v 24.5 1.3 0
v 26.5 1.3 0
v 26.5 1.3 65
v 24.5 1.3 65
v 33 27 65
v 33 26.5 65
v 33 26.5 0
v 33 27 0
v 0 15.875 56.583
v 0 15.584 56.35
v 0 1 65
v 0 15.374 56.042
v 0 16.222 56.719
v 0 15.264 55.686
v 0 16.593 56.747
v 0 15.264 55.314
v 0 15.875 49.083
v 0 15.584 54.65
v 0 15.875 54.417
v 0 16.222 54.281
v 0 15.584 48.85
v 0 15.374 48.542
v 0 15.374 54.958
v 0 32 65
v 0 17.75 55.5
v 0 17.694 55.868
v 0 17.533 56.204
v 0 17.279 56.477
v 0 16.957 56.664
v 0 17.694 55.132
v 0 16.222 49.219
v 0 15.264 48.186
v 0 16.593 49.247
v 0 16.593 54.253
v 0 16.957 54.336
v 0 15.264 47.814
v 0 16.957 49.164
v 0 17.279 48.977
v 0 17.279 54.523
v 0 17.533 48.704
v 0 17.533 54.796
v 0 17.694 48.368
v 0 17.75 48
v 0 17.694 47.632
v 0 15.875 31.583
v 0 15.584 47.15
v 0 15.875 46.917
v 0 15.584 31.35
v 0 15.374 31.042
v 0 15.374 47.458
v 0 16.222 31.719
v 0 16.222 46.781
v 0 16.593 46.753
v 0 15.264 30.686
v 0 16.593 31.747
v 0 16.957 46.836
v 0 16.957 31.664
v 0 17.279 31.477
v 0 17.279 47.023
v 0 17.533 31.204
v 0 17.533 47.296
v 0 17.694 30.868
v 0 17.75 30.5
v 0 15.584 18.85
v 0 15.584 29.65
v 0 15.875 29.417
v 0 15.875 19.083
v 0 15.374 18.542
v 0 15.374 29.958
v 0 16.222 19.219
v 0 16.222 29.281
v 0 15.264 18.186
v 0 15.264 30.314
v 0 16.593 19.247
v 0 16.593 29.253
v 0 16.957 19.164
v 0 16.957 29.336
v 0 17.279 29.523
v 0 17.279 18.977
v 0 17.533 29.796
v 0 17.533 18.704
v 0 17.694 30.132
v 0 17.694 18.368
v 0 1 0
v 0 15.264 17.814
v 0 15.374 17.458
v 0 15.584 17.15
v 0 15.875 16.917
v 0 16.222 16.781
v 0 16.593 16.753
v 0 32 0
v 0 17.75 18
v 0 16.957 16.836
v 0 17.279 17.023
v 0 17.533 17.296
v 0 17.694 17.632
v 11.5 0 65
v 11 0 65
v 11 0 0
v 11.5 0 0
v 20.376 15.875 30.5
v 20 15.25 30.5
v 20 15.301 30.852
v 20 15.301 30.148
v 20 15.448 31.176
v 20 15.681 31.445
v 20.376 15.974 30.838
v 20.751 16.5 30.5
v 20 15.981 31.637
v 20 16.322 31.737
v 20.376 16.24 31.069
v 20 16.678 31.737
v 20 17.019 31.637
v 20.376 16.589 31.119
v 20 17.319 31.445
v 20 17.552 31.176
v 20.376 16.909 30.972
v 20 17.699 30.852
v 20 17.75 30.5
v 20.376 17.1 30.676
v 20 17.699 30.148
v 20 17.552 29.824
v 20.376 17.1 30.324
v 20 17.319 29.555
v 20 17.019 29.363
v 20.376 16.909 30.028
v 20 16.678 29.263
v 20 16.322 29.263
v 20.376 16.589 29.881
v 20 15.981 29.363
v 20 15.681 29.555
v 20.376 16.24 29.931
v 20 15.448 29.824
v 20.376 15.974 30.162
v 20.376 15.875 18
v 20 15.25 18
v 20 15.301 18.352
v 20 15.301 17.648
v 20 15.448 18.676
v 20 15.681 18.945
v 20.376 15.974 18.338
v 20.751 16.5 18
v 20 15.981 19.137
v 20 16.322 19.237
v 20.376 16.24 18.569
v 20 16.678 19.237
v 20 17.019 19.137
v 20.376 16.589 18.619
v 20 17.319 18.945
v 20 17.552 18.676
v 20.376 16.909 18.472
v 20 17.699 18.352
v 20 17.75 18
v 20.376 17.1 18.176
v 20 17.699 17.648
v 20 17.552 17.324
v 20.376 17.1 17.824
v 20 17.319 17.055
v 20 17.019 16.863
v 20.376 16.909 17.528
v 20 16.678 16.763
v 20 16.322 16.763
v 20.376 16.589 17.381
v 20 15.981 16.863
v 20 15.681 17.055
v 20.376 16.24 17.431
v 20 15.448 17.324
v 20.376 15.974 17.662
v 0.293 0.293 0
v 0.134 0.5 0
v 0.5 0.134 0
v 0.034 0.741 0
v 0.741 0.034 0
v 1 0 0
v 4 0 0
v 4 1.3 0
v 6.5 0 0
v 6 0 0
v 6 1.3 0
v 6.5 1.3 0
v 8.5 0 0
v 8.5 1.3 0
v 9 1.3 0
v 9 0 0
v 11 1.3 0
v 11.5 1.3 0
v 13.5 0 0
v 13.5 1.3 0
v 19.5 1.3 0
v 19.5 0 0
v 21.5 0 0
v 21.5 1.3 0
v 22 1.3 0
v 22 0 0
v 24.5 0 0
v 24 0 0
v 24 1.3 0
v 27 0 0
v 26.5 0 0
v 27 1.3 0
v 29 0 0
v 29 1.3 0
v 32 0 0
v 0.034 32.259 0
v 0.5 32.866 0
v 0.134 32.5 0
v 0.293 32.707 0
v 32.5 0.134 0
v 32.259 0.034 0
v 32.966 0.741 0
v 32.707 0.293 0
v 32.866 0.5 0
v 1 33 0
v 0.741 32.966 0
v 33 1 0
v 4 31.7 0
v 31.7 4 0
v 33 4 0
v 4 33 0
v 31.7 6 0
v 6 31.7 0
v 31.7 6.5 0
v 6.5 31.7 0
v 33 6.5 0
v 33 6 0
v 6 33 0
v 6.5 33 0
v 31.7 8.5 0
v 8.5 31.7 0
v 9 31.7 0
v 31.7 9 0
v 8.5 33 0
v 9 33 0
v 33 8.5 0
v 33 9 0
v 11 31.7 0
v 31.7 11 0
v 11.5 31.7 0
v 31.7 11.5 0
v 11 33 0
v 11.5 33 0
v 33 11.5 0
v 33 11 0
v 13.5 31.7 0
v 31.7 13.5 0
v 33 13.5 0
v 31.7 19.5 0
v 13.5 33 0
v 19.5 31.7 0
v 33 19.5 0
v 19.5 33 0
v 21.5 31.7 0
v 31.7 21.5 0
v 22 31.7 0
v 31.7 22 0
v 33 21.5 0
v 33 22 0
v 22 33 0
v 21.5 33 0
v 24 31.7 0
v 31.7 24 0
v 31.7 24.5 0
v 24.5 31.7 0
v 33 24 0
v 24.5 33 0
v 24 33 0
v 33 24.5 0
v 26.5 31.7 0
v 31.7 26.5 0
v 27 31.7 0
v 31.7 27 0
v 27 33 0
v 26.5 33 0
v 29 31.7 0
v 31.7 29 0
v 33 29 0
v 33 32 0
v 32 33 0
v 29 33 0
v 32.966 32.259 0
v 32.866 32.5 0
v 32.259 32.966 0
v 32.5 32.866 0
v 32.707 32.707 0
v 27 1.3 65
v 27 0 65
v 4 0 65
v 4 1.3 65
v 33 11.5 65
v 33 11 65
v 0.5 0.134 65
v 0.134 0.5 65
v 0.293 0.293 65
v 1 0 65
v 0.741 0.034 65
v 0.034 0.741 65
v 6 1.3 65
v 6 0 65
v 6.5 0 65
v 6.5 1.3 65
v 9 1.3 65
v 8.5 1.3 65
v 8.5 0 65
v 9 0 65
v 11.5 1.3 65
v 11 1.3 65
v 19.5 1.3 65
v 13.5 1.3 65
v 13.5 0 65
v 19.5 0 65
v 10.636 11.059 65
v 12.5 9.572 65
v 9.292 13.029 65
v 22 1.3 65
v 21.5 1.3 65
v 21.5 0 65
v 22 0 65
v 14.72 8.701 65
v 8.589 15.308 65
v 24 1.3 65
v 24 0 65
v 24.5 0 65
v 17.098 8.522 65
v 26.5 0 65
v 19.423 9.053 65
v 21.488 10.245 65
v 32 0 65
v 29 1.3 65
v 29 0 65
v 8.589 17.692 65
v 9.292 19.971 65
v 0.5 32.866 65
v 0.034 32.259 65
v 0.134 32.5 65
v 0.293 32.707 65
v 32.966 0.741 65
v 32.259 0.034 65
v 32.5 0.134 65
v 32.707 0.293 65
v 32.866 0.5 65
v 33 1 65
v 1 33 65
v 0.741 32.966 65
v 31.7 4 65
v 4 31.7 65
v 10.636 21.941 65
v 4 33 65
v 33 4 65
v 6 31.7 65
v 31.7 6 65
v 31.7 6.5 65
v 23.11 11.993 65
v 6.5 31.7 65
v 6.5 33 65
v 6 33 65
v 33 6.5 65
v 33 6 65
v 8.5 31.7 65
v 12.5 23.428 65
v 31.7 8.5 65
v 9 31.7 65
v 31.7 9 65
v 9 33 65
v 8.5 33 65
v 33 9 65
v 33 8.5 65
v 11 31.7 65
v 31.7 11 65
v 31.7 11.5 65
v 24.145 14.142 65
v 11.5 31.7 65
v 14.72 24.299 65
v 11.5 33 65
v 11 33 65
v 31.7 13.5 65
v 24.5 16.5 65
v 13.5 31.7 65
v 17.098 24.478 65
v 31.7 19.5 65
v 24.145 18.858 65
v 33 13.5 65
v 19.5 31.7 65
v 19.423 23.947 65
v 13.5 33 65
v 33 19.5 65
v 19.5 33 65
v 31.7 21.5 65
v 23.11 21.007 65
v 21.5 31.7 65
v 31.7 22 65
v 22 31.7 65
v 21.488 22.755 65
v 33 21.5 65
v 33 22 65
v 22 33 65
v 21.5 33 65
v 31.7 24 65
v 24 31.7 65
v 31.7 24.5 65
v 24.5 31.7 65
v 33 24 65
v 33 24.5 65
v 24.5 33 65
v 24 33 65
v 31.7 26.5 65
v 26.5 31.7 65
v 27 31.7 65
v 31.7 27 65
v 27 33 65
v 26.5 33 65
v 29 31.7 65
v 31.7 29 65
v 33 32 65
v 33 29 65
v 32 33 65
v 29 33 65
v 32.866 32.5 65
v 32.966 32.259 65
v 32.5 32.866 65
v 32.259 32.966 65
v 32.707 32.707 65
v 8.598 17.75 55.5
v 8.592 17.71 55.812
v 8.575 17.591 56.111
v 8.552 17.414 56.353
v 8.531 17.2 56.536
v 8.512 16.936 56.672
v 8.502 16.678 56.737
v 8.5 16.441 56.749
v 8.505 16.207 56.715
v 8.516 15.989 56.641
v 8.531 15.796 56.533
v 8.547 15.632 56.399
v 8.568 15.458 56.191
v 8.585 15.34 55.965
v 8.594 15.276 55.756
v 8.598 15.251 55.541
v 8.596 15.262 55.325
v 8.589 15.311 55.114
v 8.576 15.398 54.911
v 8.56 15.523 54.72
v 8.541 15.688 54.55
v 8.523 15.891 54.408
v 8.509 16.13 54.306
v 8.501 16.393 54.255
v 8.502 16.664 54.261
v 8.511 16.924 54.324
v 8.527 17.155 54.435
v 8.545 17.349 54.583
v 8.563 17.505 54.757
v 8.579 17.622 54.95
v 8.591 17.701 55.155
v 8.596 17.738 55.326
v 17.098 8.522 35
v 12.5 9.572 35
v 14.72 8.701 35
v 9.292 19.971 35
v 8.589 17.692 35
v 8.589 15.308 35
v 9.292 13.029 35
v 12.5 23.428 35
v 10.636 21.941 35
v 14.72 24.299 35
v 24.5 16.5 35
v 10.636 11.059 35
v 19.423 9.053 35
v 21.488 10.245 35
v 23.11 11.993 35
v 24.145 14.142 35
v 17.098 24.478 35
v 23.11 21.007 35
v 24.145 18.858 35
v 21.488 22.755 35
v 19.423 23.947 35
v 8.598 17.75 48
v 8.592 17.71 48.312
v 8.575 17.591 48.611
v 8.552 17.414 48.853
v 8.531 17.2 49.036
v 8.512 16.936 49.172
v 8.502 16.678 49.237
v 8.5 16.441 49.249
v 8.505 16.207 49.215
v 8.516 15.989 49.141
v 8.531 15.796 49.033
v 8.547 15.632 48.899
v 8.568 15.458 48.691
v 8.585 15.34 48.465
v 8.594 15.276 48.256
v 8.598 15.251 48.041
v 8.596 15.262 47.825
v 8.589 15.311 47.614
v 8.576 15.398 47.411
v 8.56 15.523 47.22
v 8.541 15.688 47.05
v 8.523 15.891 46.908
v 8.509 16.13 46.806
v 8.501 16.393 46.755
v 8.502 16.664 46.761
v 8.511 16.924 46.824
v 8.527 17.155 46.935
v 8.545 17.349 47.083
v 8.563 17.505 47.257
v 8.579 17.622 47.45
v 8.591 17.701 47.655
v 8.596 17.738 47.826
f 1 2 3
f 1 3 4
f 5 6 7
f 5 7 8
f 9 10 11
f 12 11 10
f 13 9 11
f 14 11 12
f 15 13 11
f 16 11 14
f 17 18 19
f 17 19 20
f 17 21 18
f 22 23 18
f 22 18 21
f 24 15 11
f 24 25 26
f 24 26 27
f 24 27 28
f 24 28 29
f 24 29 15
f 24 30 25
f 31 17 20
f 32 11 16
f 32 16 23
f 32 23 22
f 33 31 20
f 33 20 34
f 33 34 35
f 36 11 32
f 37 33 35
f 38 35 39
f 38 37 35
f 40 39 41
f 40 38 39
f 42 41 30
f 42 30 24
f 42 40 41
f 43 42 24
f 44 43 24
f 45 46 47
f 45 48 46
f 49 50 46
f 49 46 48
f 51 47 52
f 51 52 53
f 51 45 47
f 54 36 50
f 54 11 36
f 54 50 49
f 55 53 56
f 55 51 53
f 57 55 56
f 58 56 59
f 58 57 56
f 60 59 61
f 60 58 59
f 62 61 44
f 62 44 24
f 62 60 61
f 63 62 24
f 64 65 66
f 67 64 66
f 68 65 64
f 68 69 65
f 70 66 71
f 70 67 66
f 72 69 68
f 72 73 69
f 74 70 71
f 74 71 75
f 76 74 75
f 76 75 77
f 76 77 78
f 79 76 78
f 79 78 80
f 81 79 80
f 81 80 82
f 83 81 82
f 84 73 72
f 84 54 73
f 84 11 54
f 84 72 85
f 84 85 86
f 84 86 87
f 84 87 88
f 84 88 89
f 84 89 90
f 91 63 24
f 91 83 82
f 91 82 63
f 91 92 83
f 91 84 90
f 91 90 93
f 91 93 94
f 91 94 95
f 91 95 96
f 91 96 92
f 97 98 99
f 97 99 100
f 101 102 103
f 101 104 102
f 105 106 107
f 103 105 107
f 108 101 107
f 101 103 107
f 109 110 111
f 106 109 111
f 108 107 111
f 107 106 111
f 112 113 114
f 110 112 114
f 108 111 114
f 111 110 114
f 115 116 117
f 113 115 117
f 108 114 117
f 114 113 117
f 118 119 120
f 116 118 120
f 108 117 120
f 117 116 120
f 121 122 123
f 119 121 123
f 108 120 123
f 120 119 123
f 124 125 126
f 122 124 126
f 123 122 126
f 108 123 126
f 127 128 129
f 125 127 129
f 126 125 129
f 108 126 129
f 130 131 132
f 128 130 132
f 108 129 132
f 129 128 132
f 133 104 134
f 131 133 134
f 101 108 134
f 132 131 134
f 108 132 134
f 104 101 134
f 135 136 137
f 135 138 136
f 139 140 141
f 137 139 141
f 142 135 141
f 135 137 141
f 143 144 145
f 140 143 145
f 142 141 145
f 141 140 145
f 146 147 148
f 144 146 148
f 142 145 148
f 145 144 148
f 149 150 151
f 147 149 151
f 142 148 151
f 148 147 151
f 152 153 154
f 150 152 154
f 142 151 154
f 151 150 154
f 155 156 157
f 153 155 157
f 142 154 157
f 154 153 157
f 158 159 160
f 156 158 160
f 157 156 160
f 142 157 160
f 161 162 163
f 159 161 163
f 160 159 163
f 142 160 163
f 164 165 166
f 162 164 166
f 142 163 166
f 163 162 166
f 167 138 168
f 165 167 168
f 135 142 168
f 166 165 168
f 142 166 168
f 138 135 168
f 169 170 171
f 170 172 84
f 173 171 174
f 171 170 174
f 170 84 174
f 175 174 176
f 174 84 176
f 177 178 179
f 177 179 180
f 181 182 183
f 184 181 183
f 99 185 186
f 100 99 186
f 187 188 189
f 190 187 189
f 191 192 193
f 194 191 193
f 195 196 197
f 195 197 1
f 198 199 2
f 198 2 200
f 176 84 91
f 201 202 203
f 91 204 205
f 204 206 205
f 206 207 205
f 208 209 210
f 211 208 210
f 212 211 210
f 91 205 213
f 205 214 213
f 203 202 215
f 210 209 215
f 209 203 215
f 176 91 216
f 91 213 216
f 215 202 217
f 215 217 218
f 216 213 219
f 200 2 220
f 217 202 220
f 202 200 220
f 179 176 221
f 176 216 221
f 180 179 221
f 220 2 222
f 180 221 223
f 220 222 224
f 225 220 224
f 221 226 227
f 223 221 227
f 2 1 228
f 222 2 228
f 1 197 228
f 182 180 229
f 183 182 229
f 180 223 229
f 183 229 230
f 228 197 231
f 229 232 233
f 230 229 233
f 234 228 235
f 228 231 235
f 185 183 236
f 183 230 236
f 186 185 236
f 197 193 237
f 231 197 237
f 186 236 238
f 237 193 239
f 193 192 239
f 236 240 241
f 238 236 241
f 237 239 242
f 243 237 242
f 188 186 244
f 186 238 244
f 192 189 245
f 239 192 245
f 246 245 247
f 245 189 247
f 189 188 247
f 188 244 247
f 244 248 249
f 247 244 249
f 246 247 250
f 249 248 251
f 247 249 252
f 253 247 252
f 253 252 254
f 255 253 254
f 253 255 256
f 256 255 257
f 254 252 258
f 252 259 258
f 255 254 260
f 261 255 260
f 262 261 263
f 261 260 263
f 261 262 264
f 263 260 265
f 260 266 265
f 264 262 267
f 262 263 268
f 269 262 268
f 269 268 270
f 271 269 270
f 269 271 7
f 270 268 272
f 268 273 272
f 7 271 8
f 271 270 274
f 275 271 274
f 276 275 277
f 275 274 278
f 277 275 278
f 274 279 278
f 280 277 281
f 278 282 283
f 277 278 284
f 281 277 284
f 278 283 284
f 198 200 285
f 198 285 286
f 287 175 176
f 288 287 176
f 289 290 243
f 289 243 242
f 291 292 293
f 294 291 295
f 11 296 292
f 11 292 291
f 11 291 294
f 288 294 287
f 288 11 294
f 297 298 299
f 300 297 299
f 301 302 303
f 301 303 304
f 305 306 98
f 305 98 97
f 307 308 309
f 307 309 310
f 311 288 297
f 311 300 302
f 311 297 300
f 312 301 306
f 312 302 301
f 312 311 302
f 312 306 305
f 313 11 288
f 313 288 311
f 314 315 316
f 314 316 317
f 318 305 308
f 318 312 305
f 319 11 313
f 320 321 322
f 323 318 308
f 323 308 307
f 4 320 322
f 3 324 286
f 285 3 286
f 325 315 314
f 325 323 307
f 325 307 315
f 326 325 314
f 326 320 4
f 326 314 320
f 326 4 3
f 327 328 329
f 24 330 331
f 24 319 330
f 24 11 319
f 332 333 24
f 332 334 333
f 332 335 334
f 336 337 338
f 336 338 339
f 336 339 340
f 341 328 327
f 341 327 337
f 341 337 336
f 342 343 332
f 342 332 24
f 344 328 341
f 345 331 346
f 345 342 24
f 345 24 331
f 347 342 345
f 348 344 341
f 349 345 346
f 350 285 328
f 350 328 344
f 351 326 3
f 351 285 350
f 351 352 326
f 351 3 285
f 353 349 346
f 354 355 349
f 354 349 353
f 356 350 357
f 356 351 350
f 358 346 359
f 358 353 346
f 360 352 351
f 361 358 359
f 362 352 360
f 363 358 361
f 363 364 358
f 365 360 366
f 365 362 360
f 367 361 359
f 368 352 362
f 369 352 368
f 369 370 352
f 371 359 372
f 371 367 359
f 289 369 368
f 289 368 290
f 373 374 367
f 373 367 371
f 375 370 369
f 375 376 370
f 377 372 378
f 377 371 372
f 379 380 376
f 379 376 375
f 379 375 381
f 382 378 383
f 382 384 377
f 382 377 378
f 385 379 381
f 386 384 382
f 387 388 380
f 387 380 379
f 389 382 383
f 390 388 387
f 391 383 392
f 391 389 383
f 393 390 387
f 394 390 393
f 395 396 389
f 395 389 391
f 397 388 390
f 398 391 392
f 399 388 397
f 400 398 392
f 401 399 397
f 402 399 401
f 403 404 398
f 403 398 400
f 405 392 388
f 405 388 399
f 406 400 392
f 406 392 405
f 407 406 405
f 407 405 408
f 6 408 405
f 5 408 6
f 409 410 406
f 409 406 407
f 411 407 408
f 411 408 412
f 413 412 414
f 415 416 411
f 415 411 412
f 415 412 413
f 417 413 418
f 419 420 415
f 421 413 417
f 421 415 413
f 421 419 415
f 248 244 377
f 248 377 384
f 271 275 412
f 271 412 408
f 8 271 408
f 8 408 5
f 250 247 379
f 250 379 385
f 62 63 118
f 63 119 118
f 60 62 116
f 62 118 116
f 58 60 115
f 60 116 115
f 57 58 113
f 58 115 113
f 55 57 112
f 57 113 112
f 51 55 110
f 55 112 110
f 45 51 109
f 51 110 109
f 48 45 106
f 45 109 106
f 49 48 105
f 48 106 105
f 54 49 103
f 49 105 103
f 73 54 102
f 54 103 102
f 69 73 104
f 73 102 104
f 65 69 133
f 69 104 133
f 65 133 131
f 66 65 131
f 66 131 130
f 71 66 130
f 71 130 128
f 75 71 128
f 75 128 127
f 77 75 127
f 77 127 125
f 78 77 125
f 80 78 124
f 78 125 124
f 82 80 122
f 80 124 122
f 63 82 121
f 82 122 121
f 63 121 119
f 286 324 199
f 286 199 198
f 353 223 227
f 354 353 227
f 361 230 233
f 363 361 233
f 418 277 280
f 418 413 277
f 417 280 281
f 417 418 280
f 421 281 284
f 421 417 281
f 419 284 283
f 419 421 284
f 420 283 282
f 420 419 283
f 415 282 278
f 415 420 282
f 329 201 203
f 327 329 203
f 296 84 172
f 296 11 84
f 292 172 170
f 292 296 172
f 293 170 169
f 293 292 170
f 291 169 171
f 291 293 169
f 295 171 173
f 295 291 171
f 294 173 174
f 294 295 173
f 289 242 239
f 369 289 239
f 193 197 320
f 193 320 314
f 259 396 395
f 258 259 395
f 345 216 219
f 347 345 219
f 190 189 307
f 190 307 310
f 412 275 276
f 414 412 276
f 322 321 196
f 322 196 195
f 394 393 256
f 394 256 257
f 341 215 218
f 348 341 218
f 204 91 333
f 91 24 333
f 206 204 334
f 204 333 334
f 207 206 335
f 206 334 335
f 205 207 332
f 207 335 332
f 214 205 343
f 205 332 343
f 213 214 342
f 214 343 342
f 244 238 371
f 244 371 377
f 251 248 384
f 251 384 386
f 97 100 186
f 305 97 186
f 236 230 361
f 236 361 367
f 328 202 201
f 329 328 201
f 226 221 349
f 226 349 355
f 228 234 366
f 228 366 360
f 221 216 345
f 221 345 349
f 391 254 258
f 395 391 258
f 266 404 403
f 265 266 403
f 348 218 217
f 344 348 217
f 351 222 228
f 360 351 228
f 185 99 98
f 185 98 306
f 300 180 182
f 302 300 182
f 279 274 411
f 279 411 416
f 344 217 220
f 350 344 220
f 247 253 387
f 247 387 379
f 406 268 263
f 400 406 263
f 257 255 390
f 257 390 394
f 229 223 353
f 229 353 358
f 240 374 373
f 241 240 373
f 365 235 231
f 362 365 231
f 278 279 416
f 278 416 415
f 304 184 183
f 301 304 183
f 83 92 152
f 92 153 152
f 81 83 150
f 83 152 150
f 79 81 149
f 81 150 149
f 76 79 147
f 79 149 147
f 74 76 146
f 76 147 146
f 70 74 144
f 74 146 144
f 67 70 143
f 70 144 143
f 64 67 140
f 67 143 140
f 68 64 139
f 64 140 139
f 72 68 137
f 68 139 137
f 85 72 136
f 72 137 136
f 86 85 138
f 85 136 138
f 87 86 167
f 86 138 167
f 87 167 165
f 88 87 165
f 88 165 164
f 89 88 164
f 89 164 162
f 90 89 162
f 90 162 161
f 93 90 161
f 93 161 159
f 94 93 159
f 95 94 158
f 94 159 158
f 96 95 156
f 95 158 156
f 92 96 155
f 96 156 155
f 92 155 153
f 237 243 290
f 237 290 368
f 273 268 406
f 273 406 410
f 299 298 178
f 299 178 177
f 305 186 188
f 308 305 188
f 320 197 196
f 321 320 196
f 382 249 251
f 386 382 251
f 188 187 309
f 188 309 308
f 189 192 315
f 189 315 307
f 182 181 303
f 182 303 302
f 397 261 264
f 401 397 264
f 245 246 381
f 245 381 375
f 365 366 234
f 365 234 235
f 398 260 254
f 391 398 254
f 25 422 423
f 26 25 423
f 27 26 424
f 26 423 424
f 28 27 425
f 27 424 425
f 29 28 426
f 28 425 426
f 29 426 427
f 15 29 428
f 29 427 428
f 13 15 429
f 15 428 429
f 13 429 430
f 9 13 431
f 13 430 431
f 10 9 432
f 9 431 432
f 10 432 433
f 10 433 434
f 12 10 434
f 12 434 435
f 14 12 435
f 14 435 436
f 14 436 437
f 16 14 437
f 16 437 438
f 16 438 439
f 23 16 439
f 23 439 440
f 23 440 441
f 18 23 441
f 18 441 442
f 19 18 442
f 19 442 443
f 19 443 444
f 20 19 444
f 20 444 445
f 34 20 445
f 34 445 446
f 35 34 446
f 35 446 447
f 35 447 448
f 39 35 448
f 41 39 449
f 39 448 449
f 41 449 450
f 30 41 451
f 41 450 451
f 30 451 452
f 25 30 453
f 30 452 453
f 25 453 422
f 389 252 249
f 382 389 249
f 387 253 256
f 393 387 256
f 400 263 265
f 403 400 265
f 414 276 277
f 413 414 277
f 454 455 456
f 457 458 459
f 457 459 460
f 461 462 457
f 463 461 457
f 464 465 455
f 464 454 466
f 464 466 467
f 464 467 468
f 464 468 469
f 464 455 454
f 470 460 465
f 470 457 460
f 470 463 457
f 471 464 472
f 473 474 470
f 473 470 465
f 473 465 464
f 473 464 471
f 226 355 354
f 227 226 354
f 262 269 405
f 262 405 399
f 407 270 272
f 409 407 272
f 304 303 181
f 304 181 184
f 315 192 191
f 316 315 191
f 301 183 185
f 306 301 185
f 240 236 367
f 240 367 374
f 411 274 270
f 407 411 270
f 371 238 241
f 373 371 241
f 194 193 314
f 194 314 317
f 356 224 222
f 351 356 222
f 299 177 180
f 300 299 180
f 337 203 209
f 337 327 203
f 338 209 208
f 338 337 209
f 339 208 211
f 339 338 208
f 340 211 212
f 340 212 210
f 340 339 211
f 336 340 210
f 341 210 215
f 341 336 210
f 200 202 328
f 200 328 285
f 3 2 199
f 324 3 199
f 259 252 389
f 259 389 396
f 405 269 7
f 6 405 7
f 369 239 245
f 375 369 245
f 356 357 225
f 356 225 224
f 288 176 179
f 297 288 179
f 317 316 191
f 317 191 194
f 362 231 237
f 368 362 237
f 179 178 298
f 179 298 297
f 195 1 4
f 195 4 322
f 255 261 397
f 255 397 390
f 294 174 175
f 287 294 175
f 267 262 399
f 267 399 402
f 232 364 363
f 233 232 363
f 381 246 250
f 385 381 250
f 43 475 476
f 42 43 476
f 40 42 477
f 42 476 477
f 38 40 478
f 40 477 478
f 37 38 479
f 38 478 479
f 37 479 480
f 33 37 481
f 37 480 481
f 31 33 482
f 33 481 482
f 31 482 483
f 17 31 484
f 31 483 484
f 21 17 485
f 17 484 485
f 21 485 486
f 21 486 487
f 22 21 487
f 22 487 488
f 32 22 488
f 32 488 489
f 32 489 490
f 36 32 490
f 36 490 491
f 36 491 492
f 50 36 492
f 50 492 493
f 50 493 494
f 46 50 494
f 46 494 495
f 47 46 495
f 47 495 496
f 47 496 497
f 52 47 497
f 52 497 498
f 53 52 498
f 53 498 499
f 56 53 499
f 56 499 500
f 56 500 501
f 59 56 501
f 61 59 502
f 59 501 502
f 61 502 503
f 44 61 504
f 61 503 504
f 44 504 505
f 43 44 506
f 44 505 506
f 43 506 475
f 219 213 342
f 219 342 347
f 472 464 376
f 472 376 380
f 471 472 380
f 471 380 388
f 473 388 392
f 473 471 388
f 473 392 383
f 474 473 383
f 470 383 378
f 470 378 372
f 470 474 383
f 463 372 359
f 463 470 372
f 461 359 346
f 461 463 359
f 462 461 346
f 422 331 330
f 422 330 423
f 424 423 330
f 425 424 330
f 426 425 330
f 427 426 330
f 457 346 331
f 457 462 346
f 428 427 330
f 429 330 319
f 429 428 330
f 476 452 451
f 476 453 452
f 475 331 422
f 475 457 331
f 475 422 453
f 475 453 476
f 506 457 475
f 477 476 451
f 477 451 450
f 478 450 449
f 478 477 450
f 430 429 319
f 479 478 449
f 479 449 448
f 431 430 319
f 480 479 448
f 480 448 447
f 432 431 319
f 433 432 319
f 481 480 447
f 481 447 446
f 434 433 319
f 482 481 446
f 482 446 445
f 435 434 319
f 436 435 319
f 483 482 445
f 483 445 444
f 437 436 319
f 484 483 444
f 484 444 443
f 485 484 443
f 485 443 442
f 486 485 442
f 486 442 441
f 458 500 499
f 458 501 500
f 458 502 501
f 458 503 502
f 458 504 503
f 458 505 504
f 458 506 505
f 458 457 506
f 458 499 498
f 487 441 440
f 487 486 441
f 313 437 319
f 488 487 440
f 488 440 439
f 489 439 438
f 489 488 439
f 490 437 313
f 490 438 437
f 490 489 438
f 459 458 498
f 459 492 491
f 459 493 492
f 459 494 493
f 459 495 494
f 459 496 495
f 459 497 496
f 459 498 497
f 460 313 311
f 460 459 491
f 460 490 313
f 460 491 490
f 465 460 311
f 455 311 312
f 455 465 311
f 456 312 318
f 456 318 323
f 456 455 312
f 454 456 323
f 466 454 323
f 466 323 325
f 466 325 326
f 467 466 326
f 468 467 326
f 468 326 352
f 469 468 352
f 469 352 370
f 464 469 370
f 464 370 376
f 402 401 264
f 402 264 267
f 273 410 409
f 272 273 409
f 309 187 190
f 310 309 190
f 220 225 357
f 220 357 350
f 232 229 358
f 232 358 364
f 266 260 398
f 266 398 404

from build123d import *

# Parameters (mm, degrees)
SKETCH1_W                   = 33
SKETCH1_H                   = 33
BOSS_EXTRUDE1_DEPTH         = 65
FILLET1_R                   = 1
CUT_EXTRUDE2_START          = -30
CUT_EXTRUDE2_OUTLINE_R      = 8
CUT_EXTRUDE2_DEPTH          = 30
TAP_DRILL_FOR_M3_TAP1_D     = 2.5
TAP_DRILL_FOR_M3_TAP1_DEPTH = 20
TAP_DRILL_FOR_M3_TAP1_TIP   = 0.751075774
CUT_EXTRUDE5_REACH          = 82.019
SKETCH6_W                   = 2
SKETCH6_H                   = 1.3
CIRPATTERN1_COUNT           = 3
CIRPATTERN1_ANGLE           = 180
CIRPATTERN1_COPY_1_REACH    = 82.019
CIRPATTERN1_COPY_1_SKETCH_W = 2
CIRPATTERN1_COPY_1_SKETCH_H = 1.3
CIRPATTERN1_COPY_2_REACH    = 82.019
CIRPATTERN1_COPY_2_SKETCH_W = 2
CIRPATTERN1_COPY_2_SKETCH_H = 1.3


# Read off the part's stored shape, not the designer's step: Cut-Extrude2
with BuildPart() as part:
    # Sketch1 → Boss-Extrude1 (new body)
    with BuildSketch(Plane.XY):
        with Locations((16.5, 16.5)):
            Rectangle(SKETCH1_W, SKETCH1_H)
    extrude(amount=BOSS_EXTRUDE1_DEPTH)

    # Fillet1
    fillet1_edges = [part.edges().sort_by_distance(p)[0] for p in [
        (0, 33, 32.5),
        (33, 33, 32.5),
        (33, 0, 32.5),
        (0, 0, 32.5),
    ]]
    fillet(fillet1_edges, radius=FILLET1_R)

    # Cut-Extrude2 outline → Cut-Extrude2 (cut)
    with BuildSketch(Plane.XY.offset(65).offset(CUT_EXTRUDE2_START)):
        with Locations((16.5, 16.5)):
            Circle(CUT_EXTRUDE2_OUTLINE_R)
    extrude(amount=CUT_EXTRUDE2_DEPTH, mode=Mode.SUBTRACT)

    # Tap Drill for M3 Tap1
    with Locations(Plane(origin=(0, 0, 0), x_dir=(0, -1, 0), z_dir=(-1, 0, 0))):
        with Locations((-16.5, 55.5), (-16.5, 48), (-16.5, 30.5), (-16.5, 18)):
            Hole(TAP_DRILL_FOR_M3_TAP1_D / 2, depth=TAP_DRILL_FOR_M3_TAP1_DEPTH)
            with Locations((0, 0, -(TAP_DRILL_FOR_M3_TAP1_DEPTH + TAP_DRILL_FOR_M3_TAP1_TIP / 2))):  # 118° drill point
                Cone(0, TAP_DRILL_FOR_M3_TAP1_D / 2, TAP_DRILL_FOR_M3_TAP1_TIP, mode=Mode.SUBTRACT)

    # Sketch6 → Cut-Extrude5 (cut, up to next)
    with BuildSketch(Plane.XY.offset(65), mode=Mode.PRIVATE) as cut_extrude5_sk1:
        with Locations((5, 32.35)):
            Rectangle(SKETCH6_W, SKETCH6_H)
    cut_extrude5_tool1 = extrude(cut_extrude5_sk1.sketch, amount=-CUT_EXTRUDE5_REACH, mode=Mode.PRIVATE) & part.part
    # Sketch6 → Cut-Extrude5 (cut, up to next)
    with BuildSketch(Plane.XY.offset(65), mode=Mode.PRIVATE) as cut_extrude5_sk2:
        with Locations((7.5, 32.35)):
            Rectangle(SKETCH6_W, SKETCH6_H)
    cut_extrude5_tool2 = extrude(cut_extrude5_sk2.sketch, amount=-CUT_EXTRUDE5_REACH, mode=Mode.PRIVATE) & part.part
    # Sketch6 → Cut-Extrude5 (cut, up to next)
    with BuildSketch(Plane.XY.offset(65), mode=Mode.PRIVATE) as cut_extrude5_sk3:
        with Locations((10, 32.35)):
            Rectangle(SKETCH6_W, SKETCH6_H)
    cut_extrude5_tool3 = extrude(cut_extrude5_sk3.sketch, amount=-CUT_EXTRUDE5_REACH, mode=Mode.PRIVATE) & part.part
    # Sketch6 → Cut-Extrude5 (cut, up to next)
    with BuildSketch(Plane.XY.offset(65), mode=Mode.PRIVATE) as cut_extrude5_sk4:
        with Locations((12.5, 32.35)):
            Rectangle(SKETCH6_W, SKETCH6_H)
    cut_extrude5_tool4 = extrude(cut_extrude5_sk4.sketch, amount=-CUT_EXTRUDE5_REACH, mode=Mode.PRIVATE) & part.part
    cut_extrude5_1 = cut_extrude5_tool1.solids().sort_by_distance((5, 32.35, 65))[0]
    add(cut_extrude5_1, mode=Mode.SUBTRACT)
    cut_extrude5_2 = cut_extrude5_tool2.solids().sort_by_distance((7.5, 32.35, 65))[0]
    add(cut_extrude5_2, mode=Mode.SUBTRACT)
    cut_extrude5_3 = cut_extrude5_tool3.solids().sort_by_distance((10, 32.35, 65))[0]
    add(cut_extrude5_3, mode=Mode.SUBTRACT)
    cut_extrude5_4 = cut_extrude5_tool4.solids().sort_by_distance((12.5, 32.35, 65))[0]
    add(cut_extrude5_4, mode=Mode.SUBTRACT)
    cut_extrude5 = cut_extrude5_1 + cut_extrude5_2 + cut_extrude5_3 + cut_extrude5_4  # Cut-Extrude5 as one shape, for the pattern or mirror that repeats it

    # Mirror2: Cut-Extrude5 across plane
    add(cut_extrude5.mirror(Plane(origin=(16.5, 0, 0), x_dir=(0, 0, 1), z_dir=(1, 0, 0))), mode=Mode.SUBTRACT)

    # CirPattern1: Cut-Extrude5 ×3 about axis
    cirpattern1_axis = Axis((16.5, 16.5, 0), (0, 0, -1))
    for i in range(1, CIRPATTERN1_COUNT):
        add(cut_extrude5.rotate(cirpattern1_axis, i * CIRPATTERN1_ANGLE / (CIRPATTERN1_COUNT - 1)), mode=Mode.SUBTRACT)

    # CirPattern1 copy 1 sketch → CirPattern1 copy 1 (cut, up to next)
    with BuildSketch(Plane(origin=(0, 0, 65), x_dir=(0, 1, 0), z_dir=(0, 0, 1)), mode=Mode.PRIVATE) as cirpattern1_copy_1_sk1:
        with Locations((5, -32.35)):
            Rectangle(CIRPATTERN1_COPY_1_SKETCH_W, CIRPATTERN1_COPY_1_SKETCH_H)
    cirpattern1_copy_1_tool1 = extrude(cirpattern1_copy_1_sk1.sketch, amount=-CIRPATTERN1_COPY_1_REACH, mode=Mode.PRIVATE) & part.part
    # CirPattern1 copy 1 sketch → CirPattern1 copy 1 (cut, up to next)
    with BuildSketch(Plane(origin=(0, 0, 65), x_dir=(0, 1, 0), z_dir=(0, 0, 1)), mode=Mode.PRIVATE) as cirpattern1_copy_1_sk2:
        with Locations((7.5, -32.35)):
            Rectangle(CIRPATTERN1_COPY_1_SKETCH_W, CIRPATTERN1_COPY_1_SKETCH_H)
    cirpattern1_copy_1_tool2 = extrude(cirpattern1_copy_1_sk2.sketch, amount=-CIRPATTERN1_COPY_1_REACH, mode=Mode.PRIVATE) & part.part
    # CirPattern1 copy 1 sketch → CirPattern1 copy 1 (cut, up to next)
    with BuildSketch(Plane(origin=(0, 0, 65), x_dir=(0, 1, 0), z_dir=(0, 0, 1)), mode=Mode.PRIVATE) as cirpattern1_copy_1_sk3:
        with Locations((10, -32.35)):
            Rectangle(CIRPATTERN1_COPY_1_SKETCH_W, CIRPATTERN1_COPY_1_SKETCH_H)
    cirpattern1_copy_1_tool3 = extrude(cirpattern1_copy_1_sk3.sketch, amount=-CIRPATTERN1_COPY_1_REACH, mode=Mode.PRIVATE) & part.part
    # CirPattern1 copy 1 sketch → CirPattern1 copy 1 (cut, up to next)
    with BuildSketch(Plane(origin=(0, 0, 65), x_dir=(0, 1, 0), z_dir=(0, 0, 1)), mode=Mode.PRIVATE) as cirpattern1_copy_1_sk4:
        with Locations((12.5, -32.35)):
            Rectangle(CIRPATTERN1_COPY_1_SKETCH_W, CIRPATTERN1_COPY_1_SKETCH_H)
    cirpattern1_copy_1_tool4 = extrude(cirpattern1_copy_1_sk4.sketch, amount=-CIRPATTERN1_COPY_1_REACH, mode=Mode.PRIVATE) & part.part
    add(cirpattern1_copy_1_tool1.solids().sort_by_distance((32.35, 5, 65))[0], mode=Mode.SUBTRACT)
    add(cirpattern1_copy_1_tool2.solids().sort_by_distance((32.35, 7.5, 65))[0], mode=Mode.SUBTRACT)
    add(cirpattern1_copy_1_tool3.solids().sort_by_distance((32.35, 10, 65))[0], mode=Mode.SUBTRACT)
    add(cirpattern1_copy_1_tool4.solids().sort_by_distance((32.35, 12.5, 65))[0], mode=Mode.SUBTRACT)

    # CirPattern1 copy 2 sketch → CirPattern1 copy 2 (cut, up to next)
    with BuildSketch(Plane(origin=(0, 33, 65), x_dir=(1, 0, 0), z_dir=(0, 0, 1)), mode=Mode.PRIVATE) as cirpattern1_copy_2_sk1:
        with Locations((5, -32.35)):
            Rectangle(CIRPATTERN1_COPY_2_SKETCH_W, CIRPATTERN1_COPY_2_SKETCH_H)
    cirpattern1_copy_2_tool1 = extrude(cirpattern1_copy_2_sk1.sketch, amount=-CIRPATTERN1_COPY_2_REACH, mode=Mode.PRIVATE) & part.part
    # CirPattern1 copy 2 sketch → CirPattern1 copy 2 (cut, up to next)
    with BuildSketch(Plane(origin=(0, 33, 65), x_dir=(1, 0, 0), z_dir=(0, 0, 1)), mode=Mode.PRIVATE) as cirpattern1_copy_2_sk2:
        with Locations((7.5, -32.35)):
            Rectangle(CIRPATTERN1_COPY_2_SKETCH_W, CIRPATTERN1_COPY_2_SKETCH_H)
    cirpattern1_copy_2_tool2 = extrude(cirpattern1_copy_2_sk2.sketch, amount=-CIRPATTERN1_COPY_2_REACH, mode=Mode.PRIVATE) & part.part
    # CirPattern1 copy 2 sketch → CirPattern1 copy 2 (cut, up to next)
    with BuildSketch(Plane(origin=(0, 33, 65), x_dir=(1, 0, 0), z_dir=(0, 0, 1)), mode=Mode.PRIVATE) as cirpattern1_copy_2_sk3:
        with Locations((10, -32.35)):
            Rectangle(CIRPATTERN1_COPY_2_SKETCH_W, CIRPATTERN1_COPY_2_SKETCH_H)
    cirpattern1_copy_2_tool3 = extrude(cirpattern1_copy_2_sk3.sketch, amount=-CIRPATTERN1_COPY_2_REACH, mode=Mode.PRIVATE) & part.part
    # CirPattern1 copy 2 sketch → CirPattern1 copy 2 (cut, up to next)
    with BuildSketch(Plane(origin=(0, 33, 65), x_dir=(1, 0, 0), z_dir=(0, 0, 1)), mode=Mode.PRIVATE) as cirpattern1_copy_2_sk4:
        with Locations((12.5, -32.35)):
            Rectangle(CIRPATTERN1_COPY_2_SKETCH_W, CIRPATTERN1_COPY_2_SKETCH_H)
    cirpattern1_copy_2_tool4 = extrude(cirpattern1_copy_2_sk4.sketch, amount=-CIRPATTERN1_COPY_2_REACH, mode=Mode.PRIVATE) & part.part
    add(cirpattern1_copy_2_tool1.solids().sort_by_distance((5, 0.65, 65))[0], mode=Mode.SUBTRACT)
    add(cirpattern1_copy_2_tool2.solids().sort_by_distance((7.5, 0.65, 65))[0], mode=Mode.SUBTRACT)
    add(cirpattern1_copy_2_tool3.solids().sort_by_distance((10, 0.65, 65))[0], mode=Mode.SUBTRACT)
    add(cirpattern1_copy_2_tool4.solids().sort_by_distance((12.5, 0.65, 65))[0], mode=Mode.SUBTRACT)


solid = part.part
